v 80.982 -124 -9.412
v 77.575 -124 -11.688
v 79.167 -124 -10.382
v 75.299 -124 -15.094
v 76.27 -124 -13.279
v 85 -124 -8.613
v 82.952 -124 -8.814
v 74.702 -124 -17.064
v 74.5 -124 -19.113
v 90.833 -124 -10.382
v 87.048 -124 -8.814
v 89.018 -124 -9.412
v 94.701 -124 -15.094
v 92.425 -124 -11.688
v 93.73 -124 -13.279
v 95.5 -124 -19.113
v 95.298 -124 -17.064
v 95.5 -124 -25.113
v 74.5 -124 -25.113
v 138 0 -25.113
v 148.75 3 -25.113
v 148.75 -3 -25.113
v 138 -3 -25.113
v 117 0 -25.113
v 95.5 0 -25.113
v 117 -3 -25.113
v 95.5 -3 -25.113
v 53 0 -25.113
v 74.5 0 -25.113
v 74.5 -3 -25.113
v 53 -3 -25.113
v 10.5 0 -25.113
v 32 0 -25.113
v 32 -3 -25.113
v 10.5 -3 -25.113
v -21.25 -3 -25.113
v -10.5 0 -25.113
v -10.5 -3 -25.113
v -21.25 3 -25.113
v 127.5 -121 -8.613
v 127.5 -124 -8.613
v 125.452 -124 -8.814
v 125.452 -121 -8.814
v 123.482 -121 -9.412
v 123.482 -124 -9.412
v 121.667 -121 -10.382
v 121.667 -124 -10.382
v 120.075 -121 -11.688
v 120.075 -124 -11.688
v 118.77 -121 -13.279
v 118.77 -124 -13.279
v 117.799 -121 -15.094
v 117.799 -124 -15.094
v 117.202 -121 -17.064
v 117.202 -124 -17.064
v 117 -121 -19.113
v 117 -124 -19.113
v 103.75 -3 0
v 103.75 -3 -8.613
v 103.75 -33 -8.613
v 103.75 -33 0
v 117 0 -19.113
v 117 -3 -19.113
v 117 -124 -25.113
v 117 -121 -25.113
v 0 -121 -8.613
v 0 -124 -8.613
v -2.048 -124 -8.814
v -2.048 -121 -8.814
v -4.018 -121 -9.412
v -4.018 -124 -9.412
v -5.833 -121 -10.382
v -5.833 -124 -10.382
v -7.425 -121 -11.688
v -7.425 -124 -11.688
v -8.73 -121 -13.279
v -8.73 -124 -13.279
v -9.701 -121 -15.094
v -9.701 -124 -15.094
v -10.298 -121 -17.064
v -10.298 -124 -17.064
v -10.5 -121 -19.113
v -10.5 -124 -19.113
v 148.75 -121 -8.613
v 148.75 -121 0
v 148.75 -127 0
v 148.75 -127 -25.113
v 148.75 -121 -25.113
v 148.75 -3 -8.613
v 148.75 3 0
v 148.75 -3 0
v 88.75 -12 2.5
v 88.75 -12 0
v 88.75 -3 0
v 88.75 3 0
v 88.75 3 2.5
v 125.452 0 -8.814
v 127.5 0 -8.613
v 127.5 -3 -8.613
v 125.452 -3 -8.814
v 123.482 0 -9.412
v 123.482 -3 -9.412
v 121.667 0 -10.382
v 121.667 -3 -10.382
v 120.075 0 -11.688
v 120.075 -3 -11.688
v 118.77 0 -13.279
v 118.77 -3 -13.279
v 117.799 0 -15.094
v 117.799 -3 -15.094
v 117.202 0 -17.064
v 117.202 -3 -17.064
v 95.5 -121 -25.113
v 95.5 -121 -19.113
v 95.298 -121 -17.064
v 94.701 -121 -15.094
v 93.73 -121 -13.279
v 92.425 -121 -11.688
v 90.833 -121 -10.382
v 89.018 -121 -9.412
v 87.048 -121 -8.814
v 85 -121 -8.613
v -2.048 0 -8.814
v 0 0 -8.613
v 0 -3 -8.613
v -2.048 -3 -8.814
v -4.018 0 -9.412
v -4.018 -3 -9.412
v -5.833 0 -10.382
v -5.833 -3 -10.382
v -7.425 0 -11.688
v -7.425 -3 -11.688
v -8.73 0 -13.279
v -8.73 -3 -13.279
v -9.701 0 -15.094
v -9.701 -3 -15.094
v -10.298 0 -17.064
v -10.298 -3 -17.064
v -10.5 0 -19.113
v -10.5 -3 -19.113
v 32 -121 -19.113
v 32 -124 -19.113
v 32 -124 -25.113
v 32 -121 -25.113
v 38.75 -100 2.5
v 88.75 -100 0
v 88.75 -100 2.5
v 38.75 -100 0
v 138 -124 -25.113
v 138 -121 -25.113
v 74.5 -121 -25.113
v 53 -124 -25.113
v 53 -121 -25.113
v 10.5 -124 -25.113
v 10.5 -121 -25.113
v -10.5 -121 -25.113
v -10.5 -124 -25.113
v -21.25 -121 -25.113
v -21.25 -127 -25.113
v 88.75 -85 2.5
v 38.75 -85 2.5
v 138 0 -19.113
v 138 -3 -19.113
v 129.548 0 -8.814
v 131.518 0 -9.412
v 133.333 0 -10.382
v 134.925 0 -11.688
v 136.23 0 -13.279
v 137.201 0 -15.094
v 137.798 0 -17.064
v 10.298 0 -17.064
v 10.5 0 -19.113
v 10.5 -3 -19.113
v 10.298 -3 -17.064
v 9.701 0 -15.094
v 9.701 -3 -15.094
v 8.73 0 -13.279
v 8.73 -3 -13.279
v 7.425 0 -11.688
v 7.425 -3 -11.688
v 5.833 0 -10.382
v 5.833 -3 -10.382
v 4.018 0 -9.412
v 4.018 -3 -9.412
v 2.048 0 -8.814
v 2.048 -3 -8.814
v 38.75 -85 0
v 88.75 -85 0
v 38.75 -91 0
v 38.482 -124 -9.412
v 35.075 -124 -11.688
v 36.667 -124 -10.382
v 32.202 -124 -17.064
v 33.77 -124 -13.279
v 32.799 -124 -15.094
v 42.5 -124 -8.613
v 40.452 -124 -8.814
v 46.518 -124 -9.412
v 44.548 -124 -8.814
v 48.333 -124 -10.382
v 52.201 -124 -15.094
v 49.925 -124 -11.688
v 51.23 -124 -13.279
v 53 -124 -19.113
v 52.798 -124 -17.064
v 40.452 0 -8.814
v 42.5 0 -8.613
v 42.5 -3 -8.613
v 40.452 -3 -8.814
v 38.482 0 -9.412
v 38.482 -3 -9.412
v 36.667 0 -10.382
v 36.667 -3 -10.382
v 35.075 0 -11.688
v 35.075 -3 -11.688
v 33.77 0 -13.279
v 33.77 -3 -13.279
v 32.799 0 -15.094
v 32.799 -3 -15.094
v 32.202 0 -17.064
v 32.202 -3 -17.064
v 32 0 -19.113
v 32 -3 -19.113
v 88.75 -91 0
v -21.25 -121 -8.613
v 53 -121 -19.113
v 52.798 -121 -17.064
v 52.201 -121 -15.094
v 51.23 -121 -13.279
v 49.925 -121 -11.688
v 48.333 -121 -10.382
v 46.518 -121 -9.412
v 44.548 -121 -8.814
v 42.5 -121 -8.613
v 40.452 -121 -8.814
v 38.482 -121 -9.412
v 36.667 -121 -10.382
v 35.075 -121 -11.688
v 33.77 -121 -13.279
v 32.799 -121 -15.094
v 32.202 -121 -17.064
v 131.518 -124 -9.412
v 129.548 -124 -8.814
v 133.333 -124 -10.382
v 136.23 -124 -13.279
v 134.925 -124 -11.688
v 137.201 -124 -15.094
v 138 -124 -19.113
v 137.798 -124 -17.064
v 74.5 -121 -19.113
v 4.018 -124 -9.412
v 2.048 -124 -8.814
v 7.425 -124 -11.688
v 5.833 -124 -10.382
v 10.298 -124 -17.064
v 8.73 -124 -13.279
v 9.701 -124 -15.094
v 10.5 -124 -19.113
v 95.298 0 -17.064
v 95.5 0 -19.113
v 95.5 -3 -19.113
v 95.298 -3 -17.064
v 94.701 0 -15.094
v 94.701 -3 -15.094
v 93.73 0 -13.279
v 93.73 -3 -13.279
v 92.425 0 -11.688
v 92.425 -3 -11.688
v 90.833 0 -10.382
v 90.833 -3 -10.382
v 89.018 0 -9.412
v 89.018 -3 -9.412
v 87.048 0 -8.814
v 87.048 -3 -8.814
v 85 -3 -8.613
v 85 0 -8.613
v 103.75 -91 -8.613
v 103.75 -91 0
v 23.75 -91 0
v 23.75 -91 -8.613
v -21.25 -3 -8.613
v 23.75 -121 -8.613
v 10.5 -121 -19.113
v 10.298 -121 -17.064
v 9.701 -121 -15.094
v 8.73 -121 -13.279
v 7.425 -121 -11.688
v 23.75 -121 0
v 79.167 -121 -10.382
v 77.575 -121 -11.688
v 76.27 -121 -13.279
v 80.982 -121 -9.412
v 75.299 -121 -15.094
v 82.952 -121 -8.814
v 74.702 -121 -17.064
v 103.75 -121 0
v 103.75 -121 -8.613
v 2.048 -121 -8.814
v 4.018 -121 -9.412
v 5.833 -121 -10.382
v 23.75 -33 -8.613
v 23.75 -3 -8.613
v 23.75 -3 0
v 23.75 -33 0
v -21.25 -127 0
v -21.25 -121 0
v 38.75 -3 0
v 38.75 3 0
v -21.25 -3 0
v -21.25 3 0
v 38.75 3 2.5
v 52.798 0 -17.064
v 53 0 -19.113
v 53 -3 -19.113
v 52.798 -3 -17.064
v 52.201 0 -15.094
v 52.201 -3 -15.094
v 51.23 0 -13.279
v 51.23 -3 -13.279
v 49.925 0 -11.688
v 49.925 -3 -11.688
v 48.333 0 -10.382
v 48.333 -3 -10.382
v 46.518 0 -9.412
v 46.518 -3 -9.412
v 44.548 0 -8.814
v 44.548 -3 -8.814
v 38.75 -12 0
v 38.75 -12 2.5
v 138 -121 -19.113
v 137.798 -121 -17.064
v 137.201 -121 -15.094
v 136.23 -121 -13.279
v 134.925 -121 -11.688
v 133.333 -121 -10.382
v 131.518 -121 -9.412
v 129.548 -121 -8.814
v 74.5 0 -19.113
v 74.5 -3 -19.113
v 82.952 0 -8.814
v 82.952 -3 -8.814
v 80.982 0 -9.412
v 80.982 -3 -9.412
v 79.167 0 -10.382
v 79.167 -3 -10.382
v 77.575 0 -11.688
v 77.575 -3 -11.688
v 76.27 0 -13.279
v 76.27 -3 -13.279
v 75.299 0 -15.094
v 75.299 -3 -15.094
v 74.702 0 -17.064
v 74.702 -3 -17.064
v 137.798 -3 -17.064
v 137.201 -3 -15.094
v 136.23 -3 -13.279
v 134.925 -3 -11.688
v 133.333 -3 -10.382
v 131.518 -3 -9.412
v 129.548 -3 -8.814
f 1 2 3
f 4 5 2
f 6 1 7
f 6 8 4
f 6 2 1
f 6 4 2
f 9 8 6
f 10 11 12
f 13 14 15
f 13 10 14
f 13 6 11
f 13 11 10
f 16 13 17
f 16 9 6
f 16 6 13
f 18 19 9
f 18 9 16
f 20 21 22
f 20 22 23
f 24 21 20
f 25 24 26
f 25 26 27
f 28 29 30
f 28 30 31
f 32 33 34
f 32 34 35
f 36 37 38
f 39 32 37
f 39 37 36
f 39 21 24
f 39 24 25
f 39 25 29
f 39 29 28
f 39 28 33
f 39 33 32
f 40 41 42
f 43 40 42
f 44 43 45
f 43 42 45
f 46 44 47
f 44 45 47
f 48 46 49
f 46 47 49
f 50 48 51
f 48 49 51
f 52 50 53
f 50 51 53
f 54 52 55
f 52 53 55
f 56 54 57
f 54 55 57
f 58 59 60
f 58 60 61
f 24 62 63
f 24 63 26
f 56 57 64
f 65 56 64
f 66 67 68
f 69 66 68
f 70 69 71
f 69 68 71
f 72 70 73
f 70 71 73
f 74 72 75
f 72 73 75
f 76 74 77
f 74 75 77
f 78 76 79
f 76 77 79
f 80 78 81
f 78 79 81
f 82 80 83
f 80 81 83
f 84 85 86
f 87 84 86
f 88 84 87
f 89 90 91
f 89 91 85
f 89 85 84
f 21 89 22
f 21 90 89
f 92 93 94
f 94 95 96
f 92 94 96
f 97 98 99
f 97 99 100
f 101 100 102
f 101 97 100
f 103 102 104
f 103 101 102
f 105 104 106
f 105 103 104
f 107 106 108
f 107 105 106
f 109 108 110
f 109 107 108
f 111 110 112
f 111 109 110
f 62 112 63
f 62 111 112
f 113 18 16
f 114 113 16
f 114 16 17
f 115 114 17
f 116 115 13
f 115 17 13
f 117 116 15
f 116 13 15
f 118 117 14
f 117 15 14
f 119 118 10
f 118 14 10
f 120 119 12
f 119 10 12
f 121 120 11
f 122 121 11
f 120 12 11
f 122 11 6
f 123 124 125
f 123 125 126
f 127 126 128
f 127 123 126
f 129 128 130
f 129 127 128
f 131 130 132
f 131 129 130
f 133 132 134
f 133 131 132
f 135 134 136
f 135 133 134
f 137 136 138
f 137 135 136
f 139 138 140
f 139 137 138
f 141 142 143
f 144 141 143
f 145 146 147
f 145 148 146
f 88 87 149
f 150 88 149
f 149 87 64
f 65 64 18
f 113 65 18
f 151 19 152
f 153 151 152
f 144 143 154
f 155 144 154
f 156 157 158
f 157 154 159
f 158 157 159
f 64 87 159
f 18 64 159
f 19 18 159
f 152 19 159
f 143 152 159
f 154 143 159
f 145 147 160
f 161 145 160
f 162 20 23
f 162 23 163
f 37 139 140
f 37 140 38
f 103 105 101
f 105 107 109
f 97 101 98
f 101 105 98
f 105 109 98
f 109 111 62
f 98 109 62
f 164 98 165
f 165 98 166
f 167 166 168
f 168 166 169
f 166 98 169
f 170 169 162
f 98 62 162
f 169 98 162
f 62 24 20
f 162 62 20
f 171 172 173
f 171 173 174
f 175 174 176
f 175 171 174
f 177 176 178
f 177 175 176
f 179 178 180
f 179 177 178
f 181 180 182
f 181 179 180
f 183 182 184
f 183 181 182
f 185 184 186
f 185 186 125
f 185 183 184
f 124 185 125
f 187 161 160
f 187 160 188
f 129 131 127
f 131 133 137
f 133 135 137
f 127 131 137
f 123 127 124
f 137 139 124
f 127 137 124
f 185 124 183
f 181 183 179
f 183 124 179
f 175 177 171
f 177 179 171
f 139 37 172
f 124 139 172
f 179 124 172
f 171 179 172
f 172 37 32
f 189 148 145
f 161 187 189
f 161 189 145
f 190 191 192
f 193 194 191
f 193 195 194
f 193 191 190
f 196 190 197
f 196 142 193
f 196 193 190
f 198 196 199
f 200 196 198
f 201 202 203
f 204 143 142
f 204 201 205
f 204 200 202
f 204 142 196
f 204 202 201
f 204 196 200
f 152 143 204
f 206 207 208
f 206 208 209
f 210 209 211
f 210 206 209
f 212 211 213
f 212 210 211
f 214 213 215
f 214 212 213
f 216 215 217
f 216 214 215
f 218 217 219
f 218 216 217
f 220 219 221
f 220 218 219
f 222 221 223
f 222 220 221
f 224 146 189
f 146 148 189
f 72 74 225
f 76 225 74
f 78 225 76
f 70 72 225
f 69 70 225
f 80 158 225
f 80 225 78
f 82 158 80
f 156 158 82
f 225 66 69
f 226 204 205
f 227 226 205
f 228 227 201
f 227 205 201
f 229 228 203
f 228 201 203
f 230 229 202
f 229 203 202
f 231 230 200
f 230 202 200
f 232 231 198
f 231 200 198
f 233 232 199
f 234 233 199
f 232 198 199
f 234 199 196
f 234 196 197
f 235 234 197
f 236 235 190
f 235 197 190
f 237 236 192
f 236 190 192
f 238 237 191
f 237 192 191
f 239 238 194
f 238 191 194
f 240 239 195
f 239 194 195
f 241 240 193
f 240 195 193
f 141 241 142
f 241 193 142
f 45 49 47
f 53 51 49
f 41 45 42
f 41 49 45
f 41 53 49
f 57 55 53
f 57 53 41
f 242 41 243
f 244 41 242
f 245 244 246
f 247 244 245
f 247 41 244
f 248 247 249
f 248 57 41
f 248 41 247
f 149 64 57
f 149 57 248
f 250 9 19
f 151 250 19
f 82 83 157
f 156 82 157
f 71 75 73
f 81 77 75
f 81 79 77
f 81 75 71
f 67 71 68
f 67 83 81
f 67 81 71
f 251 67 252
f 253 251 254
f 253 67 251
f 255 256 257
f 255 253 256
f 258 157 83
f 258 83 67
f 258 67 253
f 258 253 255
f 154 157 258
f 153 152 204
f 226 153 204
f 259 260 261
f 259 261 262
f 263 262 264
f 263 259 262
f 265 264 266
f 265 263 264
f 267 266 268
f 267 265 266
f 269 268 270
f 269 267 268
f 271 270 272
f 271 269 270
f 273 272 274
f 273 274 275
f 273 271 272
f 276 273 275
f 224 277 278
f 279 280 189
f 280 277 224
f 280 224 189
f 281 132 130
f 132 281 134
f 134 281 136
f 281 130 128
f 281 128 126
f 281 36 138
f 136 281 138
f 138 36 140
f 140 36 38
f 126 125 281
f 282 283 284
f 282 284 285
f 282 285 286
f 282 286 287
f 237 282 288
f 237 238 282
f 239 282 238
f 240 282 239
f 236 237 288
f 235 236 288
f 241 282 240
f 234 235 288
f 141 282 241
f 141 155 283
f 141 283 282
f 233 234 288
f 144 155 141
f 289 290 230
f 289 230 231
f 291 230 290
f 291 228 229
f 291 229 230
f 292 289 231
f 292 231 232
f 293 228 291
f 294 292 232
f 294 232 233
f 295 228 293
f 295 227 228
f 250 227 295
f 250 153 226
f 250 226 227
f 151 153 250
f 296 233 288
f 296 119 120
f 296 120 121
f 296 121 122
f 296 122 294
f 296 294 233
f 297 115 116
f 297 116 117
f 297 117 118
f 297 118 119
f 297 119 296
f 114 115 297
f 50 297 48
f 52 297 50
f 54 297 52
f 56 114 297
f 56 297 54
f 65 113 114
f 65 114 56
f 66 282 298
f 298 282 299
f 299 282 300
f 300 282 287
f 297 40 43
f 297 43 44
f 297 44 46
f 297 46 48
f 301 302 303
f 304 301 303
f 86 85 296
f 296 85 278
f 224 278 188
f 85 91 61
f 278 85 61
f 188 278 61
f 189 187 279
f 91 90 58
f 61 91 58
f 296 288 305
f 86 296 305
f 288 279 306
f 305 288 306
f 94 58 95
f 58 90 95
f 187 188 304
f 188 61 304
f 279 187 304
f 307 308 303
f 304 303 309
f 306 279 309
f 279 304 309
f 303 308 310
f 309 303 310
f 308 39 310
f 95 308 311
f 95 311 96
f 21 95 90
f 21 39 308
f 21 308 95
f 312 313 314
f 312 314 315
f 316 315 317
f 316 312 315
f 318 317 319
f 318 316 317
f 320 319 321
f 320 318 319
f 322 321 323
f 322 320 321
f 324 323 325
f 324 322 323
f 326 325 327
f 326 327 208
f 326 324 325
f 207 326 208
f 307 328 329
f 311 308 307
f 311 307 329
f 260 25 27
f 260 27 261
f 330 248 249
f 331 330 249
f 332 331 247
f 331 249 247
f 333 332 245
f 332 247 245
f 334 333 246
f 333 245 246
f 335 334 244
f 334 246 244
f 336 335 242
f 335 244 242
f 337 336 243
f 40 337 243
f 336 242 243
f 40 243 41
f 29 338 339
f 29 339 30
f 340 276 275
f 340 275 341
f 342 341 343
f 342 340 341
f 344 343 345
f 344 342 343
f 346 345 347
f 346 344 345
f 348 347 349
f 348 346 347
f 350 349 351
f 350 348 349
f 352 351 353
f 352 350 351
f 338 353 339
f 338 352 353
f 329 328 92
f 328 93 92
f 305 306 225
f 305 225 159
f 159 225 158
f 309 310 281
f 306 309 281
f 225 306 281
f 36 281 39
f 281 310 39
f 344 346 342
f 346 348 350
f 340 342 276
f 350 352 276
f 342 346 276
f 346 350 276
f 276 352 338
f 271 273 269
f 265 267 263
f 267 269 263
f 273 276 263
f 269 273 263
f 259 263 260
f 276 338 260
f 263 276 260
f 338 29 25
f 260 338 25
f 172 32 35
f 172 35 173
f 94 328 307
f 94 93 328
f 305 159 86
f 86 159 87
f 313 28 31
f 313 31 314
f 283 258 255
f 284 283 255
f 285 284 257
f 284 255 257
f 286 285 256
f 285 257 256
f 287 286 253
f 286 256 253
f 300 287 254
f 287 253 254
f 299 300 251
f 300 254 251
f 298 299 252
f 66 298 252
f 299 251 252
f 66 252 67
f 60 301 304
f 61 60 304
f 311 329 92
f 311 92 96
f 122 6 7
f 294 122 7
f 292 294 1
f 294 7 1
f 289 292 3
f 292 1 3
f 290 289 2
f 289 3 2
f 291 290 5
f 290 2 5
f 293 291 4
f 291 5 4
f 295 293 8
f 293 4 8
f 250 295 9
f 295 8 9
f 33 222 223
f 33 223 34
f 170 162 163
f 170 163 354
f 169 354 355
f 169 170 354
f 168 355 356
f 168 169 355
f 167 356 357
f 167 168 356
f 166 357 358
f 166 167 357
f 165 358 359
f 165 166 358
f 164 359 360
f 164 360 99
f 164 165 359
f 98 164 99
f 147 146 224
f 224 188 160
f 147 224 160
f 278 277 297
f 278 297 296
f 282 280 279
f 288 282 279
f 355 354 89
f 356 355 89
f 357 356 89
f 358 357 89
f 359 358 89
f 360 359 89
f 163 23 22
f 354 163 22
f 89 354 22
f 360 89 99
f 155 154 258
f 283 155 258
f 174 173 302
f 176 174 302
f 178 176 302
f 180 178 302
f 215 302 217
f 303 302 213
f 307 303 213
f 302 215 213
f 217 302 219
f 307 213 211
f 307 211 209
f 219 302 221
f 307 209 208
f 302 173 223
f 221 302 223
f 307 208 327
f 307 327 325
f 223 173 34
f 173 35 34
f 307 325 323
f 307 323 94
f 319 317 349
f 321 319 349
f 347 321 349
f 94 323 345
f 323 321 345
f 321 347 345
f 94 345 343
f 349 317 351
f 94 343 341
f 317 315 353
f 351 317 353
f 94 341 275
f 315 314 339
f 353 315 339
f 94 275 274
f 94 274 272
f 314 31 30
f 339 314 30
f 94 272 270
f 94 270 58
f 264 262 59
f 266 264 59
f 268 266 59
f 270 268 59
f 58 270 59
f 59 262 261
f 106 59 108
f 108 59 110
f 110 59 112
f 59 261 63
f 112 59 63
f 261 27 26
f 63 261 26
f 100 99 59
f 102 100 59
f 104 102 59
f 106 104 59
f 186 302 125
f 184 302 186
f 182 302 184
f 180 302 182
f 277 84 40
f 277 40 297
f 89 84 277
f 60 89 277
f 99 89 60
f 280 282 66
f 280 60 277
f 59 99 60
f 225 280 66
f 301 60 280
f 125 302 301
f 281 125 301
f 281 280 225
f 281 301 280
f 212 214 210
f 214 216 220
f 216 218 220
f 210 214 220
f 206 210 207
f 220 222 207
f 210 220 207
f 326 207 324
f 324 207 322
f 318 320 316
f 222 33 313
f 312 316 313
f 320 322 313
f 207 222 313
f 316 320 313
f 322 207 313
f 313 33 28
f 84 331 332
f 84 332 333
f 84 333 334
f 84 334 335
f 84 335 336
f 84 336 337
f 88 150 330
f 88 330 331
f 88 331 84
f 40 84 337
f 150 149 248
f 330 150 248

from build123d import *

# Parameters (mm, degrees)
BOSS_EXTRUDE1_DEPTH = 3
BOSS_EXTRUDE2_DEPTH = 3
LPATTERN1_COUNT     = 4
LPATTERN1_PITCH     = 42.5
SKETCH2_W           = 170
SKETCH2_H           = 8.612566395
BOSS_EXTRUDE3_DEPTH = 118
SKETCH4_W           = 2.5
SKETCH4_H           = 15
BOSS_EXTRUDE4_DEPTH = 25
SKETCH4_3_W         = 8.612566395
SKETCH4_3_H         = 30
CUT_EXTRUDE1_DEPTH  = 40


with BuildPart() as part:
    # Sketch1 → Boss-Extrude1 (new body)
    with BuildSketch(Plane(origin=(0, 0, 0), x_dir=(1, 0, 0), z_dir=(0, 1, 0))):
        with BuildLine():
            Line((-21.25, 0), (0, 0))
            Line((0, 0), (0, 8.612566395))
            ThreePointArc((0, 8.612566395), (-7.424621202, 11.687945192), (-10.5, 19.112566395))
            Line((-10.5, 19.112566395), (-10.5, 25.112566395))
            Line((-10.5, 25.112566395), (-21.25, 25.112566395))
            Line((-21.25, 25.112566395), (-21.25, 0))
        make_face()
        with BuildLine():
            Line((0, 8.612566395), (0, 0))
            Line((0, 0), (21.25, 0))
            Line((21.25, 0), (21.25, 25.112566395))
            Line((21.25, 25.112566395), (10.5, 25.112566395))
            Line((10.5, 25.112566395), (10.5, 19.112566395))
            ThreePointArc((10.5, 19.112566395), (7.424621202, 11.687945192), (0, 8.612566395))
        make_face()
        with BuildLine():
            ThreePointArc((-10.5, 19.112566395), (-7.424621202, 11.687945192), (0, 8.612566395))
            Line((0, 8.612566395), (0, 25.112566395))
            Line((0, 25.112566395), (-10.5, 25.112566395))
            Line((-10.5, 25.112566395), (-10.5, 19.112566395))
        make_face()
        with BuildLine():
            Line((0, 25.112566395), (0, 8.612566395))
            ThreePointArc((0, 8.612566395), (7.424621202, 11.687945192), (10.5, 19.112566395))
            Line((10.5, 19.112566395), (10.5, 25.112566395))
            Line((10.5, 25.112566395), (0, 25.112566395))
        make_face()
    boss_extrude1 = extrude(amount=BOSS_EXTRUDE1_DEPTH)

    # Sketch1<3> → Boss-Extrude2 (add)
    with BuildSketch(Plane(origin=(0, 0, 0), x_dir=(1, 0, 0), z_dir=(0, 1, 0))):
        with BuildLine():
            Line((-21.25, 0), (0, 0))
            Line((0, 0), (0, 8.612566395))
            ThreePointArc((0, 8.612566395), (-7.424621202, 11.687945192), (-10.5, 19.112566395))
            Line((-10.5, 19.112566395), (-10.5, 25.112566395))
            Line((-10.5, 25.112566395), (-21.25, 25.112566395))
            Line((-21.25, 25.112566395), (-21.25, 0))
        make_face()
        with BuildLine():
            Line((0, 8.612566395), (0, 0))
            Line((0, 0), (21.25, 0))
            Line((21.25, 0), (21.25, 25.112566395))
            Line((21.25, 25.112566395), (10.5, 25.112566395))
            Line((10.5, 25.112566395), (10.5, 19.112566395))
            ThreePointArc((10.5, 19.112566395), (7.424621202, 11.687945192), (0, 8.612566395))
        make_face()
    boss_extrude2 = extrude(amount=-BOSS_EXTRUDE2_DEPTH)

    # LPattern1: Boss-Extrude1, Boss-Extrude2 ×4
    with Locations(*[(i * LPATTERN1_PITCH, 0, 0) for i in range(1, LPATTERN1_COUNT)]):
        add(boss_extrude1)
        add(boss_extrude2)

    # Sketch2 → Boss-Extrude3 (add)
    with BuildSketch(Plane(origin=(0, -3, 0), x_dir=(-1, 0, 0), z_dir=(0, -1, 0))):
        with Locations((-63.75, 4.306283197)):
            Rectangle(SKETCH2_W, SKETCH2_H)
    extrude(amount=BOSS_EXTRUDE3_DEPTH)

    # Mirror2: part across plane


with BuildPart() as part_1:
    add(part.part)
    add(part.part.mirror(Plane(origin=(0, -62, 0), x_dir=(0, 0, 1), z_dir=(0, -1, 0))))

    # Sketch4 → Boss-Extrude4 (add, symmetric)
    with BuildSketch(Plane.ZY.offset(-63.75)):
        with Locations((1.25, -4.5)):
            Rectangle(SKETCH4_W, SKETCH4_H)
        Polygon((0, -91), (0, -100), (2.5, -100), (2.5, -85), (0, -85), align=None)
    extrude(amount=BOSS_EXTRUDE4_DEPTH, both=True)

    # Sketch4<3> → Cut-Extrude1 (cut, symmetric)
    with BuildSketch(Plane.ZY.offset(-63.75)):
        Polygon((0, -12), (0, -3), (-8.612566395, -3), (-8.612566395, -33), (0, -33), align=None)
        with Locations((-4.306283197, -106)):
            Rectangle(SKETCH4_3_W, SKETCH4_3_H)
    extrude(amount=CUT_EXTRUDE1_DEPTH, both=True, mode=Mode.SUBTRACT)


solid = part_1.part
